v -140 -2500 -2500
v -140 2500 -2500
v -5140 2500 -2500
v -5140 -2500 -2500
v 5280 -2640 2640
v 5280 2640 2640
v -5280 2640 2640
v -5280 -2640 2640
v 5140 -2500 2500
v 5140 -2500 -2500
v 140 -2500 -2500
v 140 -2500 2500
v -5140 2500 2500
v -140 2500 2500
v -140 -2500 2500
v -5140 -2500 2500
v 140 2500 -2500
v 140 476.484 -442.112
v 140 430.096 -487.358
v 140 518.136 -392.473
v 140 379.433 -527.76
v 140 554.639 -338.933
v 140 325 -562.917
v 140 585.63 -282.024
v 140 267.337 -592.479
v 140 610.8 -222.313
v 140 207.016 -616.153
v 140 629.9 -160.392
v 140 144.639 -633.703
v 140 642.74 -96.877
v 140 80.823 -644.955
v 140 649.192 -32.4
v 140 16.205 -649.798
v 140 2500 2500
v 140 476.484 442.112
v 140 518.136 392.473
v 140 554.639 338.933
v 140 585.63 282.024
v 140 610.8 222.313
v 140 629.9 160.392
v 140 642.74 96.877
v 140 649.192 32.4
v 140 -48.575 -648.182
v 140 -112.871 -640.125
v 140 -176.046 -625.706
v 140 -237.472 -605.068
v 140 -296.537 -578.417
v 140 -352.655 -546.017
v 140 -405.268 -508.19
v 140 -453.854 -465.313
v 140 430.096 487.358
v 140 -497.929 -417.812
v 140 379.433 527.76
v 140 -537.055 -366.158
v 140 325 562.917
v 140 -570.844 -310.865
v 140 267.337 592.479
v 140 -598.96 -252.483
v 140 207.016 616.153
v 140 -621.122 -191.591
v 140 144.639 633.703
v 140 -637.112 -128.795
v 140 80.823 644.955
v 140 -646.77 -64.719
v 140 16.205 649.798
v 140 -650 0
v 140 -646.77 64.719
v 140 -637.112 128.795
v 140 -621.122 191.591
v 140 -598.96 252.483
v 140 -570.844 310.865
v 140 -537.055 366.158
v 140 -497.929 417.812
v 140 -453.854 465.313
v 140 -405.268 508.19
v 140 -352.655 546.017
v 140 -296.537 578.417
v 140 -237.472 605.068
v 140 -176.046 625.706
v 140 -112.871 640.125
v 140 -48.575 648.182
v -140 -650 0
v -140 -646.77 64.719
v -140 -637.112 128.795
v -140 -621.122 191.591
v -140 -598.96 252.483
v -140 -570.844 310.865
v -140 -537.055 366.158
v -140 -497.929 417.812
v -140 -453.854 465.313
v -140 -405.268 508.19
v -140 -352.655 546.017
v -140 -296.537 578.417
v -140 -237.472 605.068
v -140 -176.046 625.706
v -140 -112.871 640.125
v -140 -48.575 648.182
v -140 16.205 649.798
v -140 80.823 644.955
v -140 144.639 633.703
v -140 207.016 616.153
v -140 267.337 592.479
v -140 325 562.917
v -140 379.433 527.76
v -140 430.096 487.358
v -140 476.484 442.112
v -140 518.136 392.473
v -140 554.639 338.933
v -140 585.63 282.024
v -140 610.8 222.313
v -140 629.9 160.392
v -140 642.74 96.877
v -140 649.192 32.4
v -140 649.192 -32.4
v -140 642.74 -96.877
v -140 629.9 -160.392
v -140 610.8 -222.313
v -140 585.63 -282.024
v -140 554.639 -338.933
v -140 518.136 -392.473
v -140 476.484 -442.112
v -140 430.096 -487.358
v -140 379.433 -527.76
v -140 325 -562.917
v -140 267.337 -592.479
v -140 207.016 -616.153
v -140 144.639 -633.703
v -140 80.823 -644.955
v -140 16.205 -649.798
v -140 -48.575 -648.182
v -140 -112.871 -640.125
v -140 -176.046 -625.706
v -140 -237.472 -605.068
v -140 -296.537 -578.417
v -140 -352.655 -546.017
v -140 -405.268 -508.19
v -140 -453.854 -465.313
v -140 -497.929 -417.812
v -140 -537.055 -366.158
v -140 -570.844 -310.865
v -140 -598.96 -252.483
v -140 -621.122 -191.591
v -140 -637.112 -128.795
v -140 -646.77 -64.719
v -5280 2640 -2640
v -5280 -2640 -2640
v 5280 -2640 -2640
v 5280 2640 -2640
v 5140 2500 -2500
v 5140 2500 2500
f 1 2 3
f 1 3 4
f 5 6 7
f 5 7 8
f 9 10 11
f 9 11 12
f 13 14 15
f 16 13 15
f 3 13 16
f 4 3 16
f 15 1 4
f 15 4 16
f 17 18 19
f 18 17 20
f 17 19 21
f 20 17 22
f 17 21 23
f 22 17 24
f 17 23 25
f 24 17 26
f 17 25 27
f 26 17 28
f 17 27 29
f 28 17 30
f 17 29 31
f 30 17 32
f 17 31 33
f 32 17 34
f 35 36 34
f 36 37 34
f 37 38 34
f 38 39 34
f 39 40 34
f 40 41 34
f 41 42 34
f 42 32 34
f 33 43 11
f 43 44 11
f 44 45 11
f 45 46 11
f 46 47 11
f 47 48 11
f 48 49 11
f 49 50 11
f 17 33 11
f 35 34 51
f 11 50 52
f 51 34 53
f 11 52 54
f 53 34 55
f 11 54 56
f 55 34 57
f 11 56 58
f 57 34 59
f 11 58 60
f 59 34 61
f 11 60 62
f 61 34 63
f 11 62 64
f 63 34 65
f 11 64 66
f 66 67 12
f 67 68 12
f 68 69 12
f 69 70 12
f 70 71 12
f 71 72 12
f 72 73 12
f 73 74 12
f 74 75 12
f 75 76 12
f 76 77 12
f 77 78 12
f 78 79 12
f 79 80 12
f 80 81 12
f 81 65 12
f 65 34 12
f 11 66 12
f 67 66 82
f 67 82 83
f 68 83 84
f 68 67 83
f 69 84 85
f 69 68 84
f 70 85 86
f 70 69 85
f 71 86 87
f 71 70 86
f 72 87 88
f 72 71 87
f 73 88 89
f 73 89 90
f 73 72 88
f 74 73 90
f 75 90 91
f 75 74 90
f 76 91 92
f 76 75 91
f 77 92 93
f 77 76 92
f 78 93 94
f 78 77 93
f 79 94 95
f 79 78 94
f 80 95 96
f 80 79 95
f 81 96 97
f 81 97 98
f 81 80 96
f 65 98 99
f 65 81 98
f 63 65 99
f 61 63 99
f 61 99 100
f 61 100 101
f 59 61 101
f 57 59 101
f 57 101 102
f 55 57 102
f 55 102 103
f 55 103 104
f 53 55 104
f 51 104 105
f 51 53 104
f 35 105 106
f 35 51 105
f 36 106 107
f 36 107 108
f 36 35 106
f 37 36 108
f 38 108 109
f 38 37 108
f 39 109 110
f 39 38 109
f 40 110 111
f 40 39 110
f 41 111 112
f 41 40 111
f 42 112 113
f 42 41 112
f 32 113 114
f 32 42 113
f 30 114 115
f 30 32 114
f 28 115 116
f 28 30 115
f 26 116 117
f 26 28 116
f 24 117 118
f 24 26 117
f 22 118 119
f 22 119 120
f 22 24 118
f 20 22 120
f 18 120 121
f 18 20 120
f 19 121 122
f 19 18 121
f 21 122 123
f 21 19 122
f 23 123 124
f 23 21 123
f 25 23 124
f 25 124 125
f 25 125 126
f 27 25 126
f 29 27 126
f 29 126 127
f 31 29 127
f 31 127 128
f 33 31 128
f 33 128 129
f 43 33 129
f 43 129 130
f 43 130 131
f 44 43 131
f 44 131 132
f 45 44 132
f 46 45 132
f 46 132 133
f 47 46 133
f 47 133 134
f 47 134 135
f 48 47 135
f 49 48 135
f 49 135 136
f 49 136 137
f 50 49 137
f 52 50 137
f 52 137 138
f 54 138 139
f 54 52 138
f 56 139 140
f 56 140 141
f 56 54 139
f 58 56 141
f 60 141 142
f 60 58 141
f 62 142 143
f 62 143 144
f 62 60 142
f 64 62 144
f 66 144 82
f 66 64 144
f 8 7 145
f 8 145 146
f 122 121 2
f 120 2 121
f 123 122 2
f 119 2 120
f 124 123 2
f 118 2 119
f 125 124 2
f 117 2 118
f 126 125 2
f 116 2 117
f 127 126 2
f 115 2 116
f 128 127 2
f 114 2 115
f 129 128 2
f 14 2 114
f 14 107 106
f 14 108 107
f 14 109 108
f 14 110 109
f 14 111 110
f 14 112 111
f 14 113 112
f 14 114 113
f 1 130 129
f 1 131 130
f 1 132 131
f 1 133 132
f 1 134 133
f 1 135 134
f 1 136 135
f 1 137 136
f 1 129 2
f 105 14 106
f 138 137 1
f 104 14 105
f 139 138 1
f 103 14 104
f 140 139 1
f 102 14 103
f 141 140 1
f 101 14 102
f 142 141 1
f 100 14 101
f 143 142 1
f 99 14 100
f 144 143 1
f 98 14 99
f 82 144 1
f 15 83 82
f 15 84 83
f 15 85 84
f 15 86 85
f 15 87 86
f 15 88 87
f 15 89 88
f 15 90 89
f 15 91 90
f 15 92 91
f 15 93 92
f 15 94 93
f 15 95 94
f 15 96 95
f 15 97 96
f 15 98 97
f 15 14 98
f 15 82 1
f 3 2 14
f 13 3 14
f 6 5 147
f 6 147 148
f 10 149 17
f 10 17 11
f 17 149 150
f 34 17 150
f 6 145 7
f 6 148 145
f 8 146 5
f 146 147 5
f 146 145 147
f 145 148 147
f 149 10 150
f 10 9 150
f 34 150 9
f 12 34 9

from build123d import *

# Parameters (mm, degrees)
F1_W      = 5280
F1_H      = 5280
F2_DEPTH  = 140
F3_W      = 5280
F3_H      = 5280
F3_W_2    = 5000
F3_H_2    = 5000
F4_DEPTH  = 5000
F5_W      = 5280
F5_H      = 5280
F5_W_2    = 5000
F5_H_2    = 5000
F5_R      = 650
F6_DEPTH  = 280
F7_W      = 5280
F7_H      = 5280
F7_W_2    = 5000
F7_H_2    = 5000
F8_DEPTH  = 5000
F9_W      = 5280
F9_H      = 5280
F9_W_2    = 5000
F9_H_2    = 5000
F10_DEPTH = 140


with BuildPart() as f2:
    # F1 (on offset) → F2 (new body)
    with BuildSketch(Plane.YZ.offset(5280)):
        Rectangle(F1_W, F1_H)
    extrude(amount=-F2_DEPTH)

    # F3 (on face) → F4 (join)
    with BuildSketch(Plane(origin=(5140, 0, 0), x_dir=(0, -1, 0), z_dir=(-1, 0, 0))):
        Rectangle(F3_W, F3_H)
        Rectangle(F3_W_2, F3_H_2, mode=Mode.SUBTRACT)
    extrude(amount=F4_DEPTH)

    # F5 (on face) → F6 (join)
    with BuildSketch(Plane(origin=(140, 0, 0), x_dir=(0, -1, 0), z_dir=(-1, 0, 0))):
        Rectangle(F5_W, F5_H)
        Rectangle(F5_W_2, F5_H_2, mode=Mode.SUBTRACT)
        Rectangle(F5_W_2, F5_H_2)
        Circle(F5_R, mode=Mode.SUBTRACT)
    extrude(amount=F6_DEPTH)

    # F7 (on face) → F8 (join)
    with BuildSketch(Plane(origin=(-140, 0, 0), x_dir=(0, -1, 0), z_dir=(-1, 0, 0))):
        Rectangle(F7_W, F7_H)
        Rectangle(F7_W_2, F7_H_2, mode=Mode.SUBTRACT)
    extrude(amount=F8_DEPTH)

    # F9 (on face) → F10 (join)
    with BuildSketch(Plane(origin=(-5140, 0, 0), x_dir=(0, -1, 0), z_dir=(-1, 0, 0))):
        Rectangle(F9_W, F9_H)
        Rectangle(F9_W_2, F9_H_2, mode=Mode.SUBTRACT)
        Rectangle(F9_W_2, F9_H_2)
    extrude(amount=F10_DEPTH)


solid = f2.part
